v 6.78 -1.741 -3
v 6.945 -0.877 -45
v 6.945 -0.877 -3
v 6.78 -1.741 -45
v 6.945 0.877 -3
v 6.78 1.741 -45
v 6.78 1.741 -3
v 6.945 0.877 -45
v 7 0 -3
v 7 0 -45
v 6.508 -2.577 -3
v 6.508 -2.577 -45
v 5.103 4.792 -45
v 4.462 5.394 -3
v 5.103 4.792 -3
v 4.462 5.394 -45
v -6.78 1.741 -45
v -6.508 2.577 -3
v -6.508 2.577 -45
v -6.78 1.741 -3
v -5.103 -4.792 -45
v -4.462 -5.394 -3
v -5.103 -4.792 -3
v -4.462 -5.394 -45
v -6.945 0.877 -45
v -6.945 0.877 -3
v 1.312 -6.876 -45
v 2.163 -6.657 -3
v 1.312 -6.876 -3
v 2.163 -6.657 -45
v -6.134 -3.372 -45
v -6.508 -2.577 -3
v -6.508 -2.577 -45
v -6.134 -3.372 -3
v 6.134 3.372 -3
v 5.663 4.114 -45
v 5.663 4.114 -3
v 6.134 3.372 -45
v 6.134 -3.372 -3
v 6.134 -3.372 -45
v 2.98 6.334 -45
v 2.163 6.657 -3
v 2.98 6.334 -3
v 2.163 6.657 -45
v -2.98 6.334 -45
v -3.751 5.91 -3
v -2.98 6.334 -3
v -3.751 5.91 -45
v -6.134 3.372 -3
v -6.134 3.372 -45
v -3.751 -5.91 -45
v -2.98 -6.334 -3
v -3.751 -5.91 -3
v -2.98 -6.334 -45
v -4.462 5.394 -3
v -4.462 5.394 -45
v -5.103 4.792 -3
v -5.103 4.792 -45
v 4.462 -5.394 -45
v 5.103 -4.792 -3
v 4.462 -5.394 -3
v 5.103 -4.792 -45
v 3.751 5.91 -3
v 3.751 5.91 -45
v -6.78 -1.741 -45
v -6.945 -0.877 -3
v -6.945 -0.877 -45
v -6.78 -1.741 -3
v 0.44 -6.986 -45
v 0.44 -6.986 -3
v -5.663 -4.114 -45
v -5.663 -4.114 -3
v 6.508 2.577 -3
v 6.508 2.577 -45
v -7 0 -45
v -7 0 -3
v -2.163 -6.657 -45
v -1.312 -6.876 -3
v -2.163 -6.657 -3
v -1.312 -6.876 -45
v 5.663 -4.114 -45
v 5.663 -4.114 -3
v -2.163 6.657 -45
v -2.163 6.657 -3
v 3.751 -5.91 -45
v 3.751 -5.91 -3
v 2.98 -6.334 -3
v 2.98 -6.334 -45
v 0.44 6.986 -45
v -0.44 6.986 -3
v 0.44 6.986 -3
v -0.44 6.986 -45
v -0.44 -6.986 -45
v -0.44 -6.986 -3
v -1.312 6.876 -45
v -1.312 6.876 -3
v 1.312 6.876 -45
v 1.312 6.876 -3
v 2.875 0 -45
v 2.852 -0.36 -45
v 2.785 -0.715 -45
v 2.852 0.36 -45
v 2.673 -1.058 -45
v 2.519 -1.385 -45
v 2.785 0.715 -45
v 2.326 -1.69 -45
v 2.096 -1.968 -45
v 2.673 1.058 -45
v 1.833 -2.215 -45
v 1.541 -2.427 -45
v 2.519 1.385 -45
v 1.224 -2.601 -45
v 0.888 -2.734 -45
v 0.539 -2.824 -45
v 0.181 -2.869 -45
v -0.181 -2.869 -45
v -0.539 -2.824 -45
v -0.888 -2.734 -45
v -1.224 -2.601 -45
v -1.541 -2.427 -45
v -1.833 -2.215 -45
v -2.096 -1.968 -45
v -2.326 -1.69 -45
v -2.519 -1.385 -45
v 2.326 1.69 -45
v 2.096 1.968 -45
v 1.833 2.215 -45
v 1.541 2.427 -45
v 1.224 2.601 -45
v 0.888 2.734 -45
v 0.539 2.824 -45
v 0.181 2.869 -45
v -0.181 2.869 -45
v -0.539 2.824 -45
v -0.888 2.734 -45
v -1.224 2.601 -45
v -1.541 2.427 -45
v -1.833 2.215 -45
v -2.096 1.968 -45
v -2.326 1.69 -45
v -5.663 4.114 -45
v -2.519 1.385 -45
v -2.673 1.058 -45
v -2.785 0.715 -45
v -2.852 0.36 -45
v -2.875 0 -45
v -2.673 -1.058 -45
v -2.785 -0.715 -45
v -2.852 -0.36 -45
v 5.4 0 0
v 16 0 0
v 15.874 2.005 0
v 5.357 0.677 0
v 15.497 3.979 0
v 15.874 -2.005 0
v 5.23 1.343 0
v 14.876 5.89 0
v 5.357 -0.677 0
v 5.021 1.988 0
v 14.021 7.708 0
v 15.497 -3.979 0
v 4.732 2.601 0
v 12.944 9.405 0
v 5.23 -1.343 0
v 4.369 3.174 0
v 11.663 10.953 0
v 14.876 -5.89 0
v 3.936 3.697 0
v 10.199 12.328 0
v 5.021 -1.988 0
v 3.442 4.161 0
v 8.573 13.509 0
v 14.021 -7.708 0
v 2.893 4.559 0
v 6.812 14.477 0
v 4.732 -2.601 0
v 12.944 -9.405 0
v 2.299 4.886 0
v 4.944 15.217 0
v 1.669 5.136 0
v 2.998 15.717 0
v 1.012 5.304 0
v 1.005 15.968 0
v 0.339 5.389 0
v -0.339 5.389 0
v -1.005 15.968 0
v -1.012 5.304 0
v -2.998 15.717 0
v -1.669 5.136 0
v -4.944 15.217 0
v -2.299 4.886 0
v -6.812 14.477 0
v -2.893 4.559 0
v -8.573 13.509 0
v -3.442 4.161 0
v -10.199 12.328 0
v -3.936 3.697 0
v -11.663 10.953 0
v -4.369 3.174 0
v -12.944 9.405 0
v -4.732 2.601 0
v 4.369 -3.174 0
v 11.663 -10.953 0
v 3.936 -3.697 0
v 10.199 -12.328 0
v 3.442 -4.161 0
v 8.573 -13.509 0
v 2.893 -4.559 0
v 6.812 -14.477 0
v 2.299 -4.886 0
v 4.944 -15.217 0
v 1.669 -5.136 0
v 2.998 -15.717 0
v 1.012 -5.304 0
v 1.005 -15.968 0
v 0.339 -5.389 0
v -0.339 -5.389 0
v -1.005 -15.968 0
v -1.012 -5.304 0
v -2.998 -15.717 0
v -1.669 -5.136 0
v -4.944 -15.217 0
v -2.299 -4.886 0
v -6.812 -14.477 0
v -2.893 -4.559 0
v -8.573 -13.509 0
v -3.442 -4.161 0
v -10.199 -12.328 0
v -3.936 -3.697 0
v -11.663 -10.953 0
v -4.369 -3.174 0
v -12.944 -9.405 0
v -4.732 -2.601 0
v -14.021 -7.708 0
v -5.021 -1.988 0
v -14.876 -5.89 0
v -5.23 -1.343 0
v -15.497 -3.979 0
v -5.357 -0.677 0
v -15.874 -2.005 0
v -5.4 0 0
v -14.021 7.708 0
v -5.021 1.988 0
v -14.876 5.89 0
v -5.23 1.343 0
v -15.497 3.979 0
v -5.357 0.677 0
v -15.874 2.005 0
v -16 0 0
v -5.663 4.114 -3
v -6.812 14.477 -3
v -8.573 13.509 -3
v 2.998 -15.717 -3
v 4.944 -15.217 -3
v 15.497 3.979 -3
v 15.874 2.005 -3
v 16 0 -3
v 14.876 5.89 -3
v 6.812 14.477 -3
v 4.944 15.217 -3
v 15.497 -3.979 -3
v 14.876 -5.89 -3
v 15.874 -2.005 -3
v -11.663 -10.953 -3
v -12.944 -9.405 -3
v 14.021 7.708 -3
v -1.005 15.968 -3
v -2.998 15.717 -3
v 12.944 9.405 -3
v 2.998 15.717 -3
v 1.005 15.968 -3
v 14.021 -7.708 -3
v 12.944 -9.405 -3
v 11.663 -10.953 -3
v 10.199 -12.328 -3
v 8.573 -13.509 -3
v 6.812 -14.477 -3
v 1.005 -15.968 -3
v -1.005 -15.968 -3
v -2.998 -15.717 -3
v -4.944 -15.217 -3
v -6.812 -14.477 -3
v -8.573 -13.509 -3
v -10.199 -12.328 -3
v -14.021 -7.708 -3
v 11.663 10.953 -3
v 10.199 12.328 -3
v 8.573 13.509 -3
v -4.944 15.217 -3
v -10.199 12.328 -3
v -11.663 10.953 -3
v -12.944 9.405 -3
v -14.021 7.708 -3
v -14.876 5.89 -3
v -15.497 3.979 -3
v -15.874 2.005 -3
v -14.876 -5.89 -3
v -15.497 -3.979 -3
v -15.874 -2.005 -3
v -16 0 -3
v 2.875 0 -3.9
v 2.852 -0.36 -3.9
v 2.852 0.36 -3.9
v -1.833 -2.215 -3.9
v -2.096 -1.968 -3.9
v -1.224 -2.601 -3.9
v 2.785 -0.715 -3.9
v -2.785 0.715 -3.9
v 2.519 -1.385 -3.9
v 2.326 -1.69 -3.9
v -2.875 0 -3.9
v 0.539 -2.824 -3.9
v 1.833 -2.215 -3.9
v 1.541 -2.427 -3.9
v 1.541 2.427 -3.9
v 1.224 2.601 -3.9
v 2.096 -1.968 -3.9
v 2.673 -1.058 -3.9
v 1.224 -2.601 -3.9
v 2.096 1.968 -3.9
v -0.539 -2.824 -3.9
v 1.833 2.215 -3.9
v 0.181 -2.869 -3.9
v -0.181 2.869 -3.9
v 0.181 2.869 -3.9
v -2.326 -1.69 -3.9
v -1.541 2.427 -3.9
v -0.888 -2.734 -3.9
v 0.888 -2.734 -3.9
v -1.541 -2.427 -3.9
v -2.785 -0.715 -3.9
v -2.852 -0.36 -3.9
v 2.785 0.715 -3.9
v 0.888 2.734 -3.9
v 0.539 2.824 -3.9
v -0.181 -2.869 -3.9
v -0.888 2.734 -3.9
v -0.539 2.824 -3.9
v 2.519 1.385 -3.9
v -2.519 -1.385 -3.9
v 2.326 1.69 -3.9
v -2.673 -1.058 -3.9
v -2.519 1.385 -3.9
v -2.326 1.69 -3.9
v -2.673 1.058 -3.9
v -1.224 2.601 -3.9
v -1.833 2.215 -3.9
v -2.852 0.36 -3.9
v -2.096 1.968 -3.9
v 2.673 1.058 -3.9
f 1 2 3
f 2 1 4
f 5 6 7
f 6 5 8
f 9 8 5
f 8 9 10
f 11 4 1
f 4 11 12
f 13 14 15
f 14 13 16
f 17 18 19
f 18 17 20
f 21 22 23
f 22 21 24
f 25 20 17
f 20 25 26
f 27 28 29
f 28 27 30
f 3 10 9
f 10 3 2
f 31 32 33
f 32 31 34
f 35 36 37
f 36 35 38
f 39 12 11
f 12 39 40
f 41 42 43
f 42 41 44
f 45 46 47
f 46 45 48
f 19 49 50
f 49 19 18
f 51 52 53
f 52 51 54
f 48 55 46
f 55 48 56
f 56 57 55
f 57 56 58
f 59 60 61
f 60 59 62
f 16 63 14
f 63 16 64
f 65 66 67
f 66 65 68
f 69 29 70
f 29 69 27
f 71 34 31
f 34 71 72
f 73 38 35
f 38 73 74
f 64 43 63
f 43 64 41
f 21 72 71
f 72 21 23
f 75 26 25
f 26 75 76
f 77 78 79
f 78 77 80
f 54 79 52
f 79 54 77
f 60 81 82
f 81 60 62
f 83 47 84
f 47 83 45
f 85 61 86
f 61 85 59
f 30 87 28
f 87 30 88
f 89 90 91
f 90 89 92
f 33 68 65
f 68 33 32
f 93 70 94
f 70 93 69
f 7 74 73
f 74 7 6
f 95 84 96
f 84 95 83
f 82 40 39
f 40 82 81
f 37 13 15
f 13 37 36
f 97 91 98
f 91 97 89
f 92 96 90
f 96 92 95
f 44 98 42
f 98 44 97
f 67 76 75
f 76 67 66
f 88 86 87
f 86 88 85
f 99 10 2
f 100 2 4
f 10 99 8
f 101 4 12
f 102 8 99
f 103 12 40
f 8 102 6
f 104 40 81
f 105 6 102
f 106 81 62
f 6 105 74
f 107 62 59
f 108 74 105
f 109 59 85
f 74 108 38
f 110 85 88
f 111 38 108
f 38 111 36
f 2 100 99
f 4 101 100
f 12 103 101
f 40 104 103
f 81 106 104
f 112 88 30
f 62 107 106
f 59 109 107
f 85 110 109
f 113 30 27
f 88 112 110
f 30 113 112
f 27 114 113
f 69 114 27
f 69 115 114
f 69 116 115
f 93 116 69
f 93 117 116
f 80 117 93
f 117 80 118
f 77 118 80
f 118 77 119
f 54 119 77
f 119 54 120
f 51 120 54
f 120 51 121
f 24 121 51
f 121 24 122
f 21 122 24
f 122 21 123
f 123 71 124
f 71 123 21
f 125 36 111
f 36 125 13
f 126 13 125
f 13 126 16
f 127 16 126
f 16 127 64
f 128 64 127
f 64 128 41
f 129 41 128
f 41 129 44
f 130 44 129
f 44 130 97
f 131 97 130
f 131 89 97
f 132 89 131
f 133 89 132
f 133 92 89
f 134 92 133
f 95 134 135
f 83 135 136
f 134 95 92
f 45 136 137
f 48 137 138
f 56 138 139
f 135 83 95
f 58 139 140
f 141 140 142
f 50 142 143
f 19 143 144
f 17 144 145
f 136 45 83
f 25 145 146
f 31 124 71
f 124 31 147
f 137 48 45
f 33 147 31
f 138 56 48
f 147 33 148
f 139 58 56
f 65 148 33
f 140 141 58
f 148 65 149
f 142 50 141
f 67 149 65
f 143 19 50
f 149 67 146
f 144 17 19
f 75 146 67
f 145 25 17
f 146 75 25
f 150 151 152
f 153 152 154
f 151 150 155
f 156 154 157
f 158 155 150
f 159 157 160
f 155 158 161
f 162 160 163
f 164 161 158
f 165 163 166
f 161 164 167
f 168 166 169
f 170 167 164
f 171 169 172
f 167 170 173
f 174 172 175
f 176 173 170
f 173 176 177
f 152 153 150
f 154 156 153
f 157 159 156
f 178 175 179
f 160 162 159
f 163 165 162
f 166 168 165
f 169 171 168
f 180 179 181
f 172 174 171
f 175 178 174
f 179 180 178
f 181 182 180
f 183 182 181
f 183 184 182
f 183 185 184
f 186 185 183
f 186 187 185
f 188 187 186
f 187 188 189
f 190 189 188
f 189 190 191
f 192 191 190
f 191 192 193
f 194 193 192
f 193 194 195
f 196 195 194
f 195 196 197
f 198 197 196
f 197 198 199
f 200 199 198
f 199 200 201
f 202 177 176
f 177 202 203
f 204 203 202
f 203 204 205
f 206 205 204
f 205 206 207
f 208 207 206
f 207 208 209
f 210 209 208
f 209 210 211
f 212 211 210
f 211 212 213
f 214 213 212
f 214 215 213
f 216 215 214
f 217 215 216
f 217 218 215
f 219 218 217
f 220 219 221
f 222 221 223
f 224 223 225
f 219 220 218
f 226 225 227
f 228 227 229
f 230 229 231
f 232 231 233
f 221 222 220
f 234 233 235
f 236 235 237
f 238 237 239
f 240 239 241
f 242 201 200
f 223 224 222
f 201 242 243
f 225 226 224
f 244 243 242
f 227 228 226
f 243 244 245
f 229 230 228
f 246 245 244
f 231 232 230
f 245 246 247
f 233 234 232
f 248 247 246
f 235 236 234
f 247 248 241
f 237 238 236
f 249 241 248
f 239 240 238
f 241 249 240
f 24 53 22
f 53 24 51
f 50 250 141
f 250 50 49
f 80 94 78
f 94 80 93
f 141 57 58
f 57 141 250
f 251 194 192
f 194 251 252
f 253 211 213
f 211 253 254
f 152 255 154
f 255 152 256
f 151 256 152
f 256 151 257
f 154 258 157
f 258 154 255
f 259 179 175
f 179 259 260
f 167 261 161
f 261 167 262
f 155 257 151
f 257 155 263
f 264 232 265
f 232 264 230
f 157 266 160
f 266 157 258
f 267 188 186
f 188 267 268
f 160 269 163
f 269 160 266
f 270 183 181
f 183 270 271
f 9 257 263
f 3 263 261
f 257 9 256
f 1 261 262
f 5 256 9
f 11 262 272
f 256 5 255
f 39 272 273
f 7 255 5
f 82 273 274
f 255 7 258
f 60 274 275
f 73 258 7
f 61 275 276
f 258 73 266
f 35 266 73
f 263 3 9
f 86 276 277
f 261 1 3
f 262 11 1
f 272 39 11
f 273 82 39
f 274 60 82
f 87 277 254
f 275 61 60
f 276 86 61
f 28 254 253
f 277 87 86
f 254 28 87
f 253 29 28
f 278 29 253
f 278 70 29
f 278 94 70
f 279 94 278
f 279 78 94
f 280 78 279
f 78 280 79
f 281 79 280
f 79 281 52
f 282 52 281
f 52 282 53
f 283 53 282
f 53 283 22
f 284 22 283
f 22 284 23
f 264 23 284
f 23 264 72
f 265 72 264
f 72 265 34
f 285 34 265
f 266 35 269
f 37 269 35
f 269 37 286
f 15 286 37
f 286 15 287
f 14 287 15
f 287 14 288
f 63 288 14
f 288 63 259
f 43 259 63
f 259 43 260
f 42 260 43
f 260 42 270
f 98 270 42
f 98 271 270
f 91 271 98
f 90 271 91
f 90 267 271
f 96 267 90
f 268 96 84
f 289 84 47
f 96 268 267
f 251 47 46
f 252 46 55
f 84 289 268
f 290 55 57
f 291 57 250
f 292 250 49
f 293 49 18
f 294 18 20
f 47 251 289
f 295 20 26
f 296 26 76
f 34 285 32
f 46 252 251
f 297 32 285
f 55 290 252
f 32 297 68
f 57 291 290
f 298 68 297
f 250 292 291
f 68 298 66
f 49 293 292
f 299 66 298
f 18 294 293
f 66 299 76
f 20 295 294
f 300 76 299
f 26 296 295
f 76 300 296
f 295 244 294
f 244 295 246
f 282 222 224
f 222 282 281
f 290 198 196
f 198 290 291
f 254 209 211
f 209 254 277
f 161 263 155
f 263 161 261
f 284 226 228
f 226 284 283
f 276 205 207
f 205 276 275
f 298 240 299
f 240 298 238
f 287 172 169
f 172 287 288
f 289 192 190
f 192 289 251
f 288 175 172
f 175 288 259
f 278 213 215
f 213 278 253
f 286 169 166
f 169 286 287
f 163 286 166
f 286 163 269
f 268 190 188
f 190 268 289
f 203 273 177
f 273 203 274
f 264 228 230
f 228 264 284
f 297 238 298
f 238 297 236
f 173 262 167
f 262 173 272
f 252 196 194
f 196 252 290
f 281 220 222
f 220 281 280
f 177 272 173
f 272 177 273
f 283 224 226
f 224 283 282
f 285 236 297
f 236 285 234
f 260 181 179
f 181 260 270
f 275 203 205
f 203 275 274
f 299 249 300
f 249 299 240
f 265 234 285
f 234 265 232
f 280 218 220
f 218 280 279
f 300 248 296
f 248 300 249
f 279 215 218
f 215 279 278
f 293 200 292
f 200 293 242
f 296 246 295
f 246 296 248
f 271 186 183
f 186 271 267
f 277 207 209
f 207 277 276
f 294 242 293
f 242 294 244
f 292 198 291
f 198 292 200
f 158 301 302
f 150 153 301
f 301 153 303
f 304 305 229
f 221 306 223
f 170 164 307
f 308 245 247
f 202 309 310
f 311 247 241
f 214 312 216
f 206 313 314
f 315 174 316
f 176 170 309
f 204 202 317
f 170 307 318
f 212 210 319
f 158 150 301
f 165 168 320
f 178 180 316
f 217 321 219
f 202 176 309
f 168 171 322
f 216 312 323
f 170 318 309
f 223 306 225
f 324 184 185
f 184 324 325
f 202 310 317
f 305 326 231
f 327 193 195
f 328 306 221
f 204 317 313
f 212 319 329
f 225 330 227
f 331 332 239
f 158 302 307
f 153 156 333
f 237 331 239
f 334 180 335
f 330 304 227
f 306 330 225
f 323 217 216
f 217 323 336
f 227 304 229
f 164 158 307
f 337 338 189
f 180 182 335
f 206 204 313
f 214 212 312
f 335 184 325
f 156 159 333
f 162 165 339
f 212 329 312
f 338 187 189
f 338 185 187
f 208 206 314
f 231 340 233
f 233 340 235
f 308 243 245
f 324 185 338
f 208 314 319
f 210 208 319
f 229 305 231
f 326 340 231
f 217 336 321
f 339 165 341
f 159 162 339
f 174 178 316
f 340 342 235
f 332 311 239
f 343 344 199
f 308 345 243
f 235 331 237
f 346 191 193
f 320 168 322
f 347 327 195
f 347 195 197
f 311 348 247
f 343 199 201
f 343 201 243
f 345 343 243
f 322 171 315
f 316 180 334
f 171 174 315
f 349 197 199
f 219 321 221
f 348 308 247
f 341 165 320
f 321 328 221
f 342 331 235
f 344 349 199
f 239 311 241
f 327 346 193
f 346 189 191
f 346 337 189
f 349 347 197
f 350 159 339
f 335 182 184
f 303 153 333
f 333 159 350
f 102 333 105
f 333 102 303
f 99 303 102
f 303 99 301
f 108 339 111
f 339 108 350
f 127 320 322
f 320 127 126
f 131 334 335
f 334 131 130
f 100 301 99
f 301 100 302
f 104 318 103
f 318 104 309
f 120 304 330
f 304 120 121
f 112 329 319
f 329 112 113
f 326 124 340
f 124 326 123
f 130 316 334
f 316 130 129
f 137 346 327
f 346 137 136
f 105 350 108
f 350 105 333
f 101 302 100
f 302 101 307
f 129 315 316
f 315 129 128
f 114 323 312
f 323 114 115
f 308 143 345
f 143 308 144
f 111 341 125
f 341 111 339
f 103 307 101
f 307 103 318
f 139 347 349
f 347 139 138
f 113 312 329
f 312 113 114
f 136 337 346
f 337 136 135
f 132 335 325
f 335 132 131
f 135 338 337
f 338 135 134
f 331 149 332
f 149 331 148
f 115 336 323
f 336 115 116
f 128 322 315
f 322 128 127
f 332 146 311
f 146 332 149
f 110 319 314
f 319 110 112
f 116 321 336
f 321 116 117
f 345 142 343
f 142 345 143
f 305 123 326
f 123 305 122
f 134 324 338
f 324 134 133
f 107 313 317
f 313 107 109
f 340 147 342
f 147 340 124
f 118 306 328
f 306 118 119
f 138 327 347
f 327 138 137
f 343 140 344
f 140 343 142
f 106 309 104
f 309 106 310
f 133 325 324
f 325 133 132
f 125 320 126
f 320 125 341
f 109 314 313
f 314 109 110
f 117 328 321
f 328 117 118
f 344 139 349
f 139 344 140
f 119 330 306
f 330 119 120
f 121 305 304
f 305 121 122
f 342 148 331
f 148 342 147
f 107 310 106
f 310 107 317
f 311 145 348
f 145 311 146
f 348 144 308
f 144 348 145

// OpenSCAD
$fn = 50;


difference() {
	union() {
		translate(v = [0, 0, -45.0000000000]) {
			cylinder(h = 45, r = 7.0000000000);
		}
		translate(v = [0, 0, -3.0000000000]) {
			cylinder(h = 3, r = 16.0000000000);
		}
	}
	union() {
		translate(v = [0, 0, 0]) {
			rotate(a = [0, 0, 0]) {
				difference() {
					union() {
						#translate(v = [0, 0, -45.0000000000]) {
							cylinder(h = 45, r = 2.6000000000);
						}
						#translate(v = [0, 0, -3.9000000000]) {
							cylinder(h = 3.9000000000, r1 = 2.8750000000, r2 = 5.4000000000);
						}
						#translate(v = [0, 0, -45.0000000000]) {
							cylinder(h = 45, r = 2.8750000000);
						}
						#translate(v = [0, 0, -45.0000000000]) {
							cylinder(h = 45, r = 2.6000000000);
						}
					}
					union();
				}
			}
		}
	}
}
